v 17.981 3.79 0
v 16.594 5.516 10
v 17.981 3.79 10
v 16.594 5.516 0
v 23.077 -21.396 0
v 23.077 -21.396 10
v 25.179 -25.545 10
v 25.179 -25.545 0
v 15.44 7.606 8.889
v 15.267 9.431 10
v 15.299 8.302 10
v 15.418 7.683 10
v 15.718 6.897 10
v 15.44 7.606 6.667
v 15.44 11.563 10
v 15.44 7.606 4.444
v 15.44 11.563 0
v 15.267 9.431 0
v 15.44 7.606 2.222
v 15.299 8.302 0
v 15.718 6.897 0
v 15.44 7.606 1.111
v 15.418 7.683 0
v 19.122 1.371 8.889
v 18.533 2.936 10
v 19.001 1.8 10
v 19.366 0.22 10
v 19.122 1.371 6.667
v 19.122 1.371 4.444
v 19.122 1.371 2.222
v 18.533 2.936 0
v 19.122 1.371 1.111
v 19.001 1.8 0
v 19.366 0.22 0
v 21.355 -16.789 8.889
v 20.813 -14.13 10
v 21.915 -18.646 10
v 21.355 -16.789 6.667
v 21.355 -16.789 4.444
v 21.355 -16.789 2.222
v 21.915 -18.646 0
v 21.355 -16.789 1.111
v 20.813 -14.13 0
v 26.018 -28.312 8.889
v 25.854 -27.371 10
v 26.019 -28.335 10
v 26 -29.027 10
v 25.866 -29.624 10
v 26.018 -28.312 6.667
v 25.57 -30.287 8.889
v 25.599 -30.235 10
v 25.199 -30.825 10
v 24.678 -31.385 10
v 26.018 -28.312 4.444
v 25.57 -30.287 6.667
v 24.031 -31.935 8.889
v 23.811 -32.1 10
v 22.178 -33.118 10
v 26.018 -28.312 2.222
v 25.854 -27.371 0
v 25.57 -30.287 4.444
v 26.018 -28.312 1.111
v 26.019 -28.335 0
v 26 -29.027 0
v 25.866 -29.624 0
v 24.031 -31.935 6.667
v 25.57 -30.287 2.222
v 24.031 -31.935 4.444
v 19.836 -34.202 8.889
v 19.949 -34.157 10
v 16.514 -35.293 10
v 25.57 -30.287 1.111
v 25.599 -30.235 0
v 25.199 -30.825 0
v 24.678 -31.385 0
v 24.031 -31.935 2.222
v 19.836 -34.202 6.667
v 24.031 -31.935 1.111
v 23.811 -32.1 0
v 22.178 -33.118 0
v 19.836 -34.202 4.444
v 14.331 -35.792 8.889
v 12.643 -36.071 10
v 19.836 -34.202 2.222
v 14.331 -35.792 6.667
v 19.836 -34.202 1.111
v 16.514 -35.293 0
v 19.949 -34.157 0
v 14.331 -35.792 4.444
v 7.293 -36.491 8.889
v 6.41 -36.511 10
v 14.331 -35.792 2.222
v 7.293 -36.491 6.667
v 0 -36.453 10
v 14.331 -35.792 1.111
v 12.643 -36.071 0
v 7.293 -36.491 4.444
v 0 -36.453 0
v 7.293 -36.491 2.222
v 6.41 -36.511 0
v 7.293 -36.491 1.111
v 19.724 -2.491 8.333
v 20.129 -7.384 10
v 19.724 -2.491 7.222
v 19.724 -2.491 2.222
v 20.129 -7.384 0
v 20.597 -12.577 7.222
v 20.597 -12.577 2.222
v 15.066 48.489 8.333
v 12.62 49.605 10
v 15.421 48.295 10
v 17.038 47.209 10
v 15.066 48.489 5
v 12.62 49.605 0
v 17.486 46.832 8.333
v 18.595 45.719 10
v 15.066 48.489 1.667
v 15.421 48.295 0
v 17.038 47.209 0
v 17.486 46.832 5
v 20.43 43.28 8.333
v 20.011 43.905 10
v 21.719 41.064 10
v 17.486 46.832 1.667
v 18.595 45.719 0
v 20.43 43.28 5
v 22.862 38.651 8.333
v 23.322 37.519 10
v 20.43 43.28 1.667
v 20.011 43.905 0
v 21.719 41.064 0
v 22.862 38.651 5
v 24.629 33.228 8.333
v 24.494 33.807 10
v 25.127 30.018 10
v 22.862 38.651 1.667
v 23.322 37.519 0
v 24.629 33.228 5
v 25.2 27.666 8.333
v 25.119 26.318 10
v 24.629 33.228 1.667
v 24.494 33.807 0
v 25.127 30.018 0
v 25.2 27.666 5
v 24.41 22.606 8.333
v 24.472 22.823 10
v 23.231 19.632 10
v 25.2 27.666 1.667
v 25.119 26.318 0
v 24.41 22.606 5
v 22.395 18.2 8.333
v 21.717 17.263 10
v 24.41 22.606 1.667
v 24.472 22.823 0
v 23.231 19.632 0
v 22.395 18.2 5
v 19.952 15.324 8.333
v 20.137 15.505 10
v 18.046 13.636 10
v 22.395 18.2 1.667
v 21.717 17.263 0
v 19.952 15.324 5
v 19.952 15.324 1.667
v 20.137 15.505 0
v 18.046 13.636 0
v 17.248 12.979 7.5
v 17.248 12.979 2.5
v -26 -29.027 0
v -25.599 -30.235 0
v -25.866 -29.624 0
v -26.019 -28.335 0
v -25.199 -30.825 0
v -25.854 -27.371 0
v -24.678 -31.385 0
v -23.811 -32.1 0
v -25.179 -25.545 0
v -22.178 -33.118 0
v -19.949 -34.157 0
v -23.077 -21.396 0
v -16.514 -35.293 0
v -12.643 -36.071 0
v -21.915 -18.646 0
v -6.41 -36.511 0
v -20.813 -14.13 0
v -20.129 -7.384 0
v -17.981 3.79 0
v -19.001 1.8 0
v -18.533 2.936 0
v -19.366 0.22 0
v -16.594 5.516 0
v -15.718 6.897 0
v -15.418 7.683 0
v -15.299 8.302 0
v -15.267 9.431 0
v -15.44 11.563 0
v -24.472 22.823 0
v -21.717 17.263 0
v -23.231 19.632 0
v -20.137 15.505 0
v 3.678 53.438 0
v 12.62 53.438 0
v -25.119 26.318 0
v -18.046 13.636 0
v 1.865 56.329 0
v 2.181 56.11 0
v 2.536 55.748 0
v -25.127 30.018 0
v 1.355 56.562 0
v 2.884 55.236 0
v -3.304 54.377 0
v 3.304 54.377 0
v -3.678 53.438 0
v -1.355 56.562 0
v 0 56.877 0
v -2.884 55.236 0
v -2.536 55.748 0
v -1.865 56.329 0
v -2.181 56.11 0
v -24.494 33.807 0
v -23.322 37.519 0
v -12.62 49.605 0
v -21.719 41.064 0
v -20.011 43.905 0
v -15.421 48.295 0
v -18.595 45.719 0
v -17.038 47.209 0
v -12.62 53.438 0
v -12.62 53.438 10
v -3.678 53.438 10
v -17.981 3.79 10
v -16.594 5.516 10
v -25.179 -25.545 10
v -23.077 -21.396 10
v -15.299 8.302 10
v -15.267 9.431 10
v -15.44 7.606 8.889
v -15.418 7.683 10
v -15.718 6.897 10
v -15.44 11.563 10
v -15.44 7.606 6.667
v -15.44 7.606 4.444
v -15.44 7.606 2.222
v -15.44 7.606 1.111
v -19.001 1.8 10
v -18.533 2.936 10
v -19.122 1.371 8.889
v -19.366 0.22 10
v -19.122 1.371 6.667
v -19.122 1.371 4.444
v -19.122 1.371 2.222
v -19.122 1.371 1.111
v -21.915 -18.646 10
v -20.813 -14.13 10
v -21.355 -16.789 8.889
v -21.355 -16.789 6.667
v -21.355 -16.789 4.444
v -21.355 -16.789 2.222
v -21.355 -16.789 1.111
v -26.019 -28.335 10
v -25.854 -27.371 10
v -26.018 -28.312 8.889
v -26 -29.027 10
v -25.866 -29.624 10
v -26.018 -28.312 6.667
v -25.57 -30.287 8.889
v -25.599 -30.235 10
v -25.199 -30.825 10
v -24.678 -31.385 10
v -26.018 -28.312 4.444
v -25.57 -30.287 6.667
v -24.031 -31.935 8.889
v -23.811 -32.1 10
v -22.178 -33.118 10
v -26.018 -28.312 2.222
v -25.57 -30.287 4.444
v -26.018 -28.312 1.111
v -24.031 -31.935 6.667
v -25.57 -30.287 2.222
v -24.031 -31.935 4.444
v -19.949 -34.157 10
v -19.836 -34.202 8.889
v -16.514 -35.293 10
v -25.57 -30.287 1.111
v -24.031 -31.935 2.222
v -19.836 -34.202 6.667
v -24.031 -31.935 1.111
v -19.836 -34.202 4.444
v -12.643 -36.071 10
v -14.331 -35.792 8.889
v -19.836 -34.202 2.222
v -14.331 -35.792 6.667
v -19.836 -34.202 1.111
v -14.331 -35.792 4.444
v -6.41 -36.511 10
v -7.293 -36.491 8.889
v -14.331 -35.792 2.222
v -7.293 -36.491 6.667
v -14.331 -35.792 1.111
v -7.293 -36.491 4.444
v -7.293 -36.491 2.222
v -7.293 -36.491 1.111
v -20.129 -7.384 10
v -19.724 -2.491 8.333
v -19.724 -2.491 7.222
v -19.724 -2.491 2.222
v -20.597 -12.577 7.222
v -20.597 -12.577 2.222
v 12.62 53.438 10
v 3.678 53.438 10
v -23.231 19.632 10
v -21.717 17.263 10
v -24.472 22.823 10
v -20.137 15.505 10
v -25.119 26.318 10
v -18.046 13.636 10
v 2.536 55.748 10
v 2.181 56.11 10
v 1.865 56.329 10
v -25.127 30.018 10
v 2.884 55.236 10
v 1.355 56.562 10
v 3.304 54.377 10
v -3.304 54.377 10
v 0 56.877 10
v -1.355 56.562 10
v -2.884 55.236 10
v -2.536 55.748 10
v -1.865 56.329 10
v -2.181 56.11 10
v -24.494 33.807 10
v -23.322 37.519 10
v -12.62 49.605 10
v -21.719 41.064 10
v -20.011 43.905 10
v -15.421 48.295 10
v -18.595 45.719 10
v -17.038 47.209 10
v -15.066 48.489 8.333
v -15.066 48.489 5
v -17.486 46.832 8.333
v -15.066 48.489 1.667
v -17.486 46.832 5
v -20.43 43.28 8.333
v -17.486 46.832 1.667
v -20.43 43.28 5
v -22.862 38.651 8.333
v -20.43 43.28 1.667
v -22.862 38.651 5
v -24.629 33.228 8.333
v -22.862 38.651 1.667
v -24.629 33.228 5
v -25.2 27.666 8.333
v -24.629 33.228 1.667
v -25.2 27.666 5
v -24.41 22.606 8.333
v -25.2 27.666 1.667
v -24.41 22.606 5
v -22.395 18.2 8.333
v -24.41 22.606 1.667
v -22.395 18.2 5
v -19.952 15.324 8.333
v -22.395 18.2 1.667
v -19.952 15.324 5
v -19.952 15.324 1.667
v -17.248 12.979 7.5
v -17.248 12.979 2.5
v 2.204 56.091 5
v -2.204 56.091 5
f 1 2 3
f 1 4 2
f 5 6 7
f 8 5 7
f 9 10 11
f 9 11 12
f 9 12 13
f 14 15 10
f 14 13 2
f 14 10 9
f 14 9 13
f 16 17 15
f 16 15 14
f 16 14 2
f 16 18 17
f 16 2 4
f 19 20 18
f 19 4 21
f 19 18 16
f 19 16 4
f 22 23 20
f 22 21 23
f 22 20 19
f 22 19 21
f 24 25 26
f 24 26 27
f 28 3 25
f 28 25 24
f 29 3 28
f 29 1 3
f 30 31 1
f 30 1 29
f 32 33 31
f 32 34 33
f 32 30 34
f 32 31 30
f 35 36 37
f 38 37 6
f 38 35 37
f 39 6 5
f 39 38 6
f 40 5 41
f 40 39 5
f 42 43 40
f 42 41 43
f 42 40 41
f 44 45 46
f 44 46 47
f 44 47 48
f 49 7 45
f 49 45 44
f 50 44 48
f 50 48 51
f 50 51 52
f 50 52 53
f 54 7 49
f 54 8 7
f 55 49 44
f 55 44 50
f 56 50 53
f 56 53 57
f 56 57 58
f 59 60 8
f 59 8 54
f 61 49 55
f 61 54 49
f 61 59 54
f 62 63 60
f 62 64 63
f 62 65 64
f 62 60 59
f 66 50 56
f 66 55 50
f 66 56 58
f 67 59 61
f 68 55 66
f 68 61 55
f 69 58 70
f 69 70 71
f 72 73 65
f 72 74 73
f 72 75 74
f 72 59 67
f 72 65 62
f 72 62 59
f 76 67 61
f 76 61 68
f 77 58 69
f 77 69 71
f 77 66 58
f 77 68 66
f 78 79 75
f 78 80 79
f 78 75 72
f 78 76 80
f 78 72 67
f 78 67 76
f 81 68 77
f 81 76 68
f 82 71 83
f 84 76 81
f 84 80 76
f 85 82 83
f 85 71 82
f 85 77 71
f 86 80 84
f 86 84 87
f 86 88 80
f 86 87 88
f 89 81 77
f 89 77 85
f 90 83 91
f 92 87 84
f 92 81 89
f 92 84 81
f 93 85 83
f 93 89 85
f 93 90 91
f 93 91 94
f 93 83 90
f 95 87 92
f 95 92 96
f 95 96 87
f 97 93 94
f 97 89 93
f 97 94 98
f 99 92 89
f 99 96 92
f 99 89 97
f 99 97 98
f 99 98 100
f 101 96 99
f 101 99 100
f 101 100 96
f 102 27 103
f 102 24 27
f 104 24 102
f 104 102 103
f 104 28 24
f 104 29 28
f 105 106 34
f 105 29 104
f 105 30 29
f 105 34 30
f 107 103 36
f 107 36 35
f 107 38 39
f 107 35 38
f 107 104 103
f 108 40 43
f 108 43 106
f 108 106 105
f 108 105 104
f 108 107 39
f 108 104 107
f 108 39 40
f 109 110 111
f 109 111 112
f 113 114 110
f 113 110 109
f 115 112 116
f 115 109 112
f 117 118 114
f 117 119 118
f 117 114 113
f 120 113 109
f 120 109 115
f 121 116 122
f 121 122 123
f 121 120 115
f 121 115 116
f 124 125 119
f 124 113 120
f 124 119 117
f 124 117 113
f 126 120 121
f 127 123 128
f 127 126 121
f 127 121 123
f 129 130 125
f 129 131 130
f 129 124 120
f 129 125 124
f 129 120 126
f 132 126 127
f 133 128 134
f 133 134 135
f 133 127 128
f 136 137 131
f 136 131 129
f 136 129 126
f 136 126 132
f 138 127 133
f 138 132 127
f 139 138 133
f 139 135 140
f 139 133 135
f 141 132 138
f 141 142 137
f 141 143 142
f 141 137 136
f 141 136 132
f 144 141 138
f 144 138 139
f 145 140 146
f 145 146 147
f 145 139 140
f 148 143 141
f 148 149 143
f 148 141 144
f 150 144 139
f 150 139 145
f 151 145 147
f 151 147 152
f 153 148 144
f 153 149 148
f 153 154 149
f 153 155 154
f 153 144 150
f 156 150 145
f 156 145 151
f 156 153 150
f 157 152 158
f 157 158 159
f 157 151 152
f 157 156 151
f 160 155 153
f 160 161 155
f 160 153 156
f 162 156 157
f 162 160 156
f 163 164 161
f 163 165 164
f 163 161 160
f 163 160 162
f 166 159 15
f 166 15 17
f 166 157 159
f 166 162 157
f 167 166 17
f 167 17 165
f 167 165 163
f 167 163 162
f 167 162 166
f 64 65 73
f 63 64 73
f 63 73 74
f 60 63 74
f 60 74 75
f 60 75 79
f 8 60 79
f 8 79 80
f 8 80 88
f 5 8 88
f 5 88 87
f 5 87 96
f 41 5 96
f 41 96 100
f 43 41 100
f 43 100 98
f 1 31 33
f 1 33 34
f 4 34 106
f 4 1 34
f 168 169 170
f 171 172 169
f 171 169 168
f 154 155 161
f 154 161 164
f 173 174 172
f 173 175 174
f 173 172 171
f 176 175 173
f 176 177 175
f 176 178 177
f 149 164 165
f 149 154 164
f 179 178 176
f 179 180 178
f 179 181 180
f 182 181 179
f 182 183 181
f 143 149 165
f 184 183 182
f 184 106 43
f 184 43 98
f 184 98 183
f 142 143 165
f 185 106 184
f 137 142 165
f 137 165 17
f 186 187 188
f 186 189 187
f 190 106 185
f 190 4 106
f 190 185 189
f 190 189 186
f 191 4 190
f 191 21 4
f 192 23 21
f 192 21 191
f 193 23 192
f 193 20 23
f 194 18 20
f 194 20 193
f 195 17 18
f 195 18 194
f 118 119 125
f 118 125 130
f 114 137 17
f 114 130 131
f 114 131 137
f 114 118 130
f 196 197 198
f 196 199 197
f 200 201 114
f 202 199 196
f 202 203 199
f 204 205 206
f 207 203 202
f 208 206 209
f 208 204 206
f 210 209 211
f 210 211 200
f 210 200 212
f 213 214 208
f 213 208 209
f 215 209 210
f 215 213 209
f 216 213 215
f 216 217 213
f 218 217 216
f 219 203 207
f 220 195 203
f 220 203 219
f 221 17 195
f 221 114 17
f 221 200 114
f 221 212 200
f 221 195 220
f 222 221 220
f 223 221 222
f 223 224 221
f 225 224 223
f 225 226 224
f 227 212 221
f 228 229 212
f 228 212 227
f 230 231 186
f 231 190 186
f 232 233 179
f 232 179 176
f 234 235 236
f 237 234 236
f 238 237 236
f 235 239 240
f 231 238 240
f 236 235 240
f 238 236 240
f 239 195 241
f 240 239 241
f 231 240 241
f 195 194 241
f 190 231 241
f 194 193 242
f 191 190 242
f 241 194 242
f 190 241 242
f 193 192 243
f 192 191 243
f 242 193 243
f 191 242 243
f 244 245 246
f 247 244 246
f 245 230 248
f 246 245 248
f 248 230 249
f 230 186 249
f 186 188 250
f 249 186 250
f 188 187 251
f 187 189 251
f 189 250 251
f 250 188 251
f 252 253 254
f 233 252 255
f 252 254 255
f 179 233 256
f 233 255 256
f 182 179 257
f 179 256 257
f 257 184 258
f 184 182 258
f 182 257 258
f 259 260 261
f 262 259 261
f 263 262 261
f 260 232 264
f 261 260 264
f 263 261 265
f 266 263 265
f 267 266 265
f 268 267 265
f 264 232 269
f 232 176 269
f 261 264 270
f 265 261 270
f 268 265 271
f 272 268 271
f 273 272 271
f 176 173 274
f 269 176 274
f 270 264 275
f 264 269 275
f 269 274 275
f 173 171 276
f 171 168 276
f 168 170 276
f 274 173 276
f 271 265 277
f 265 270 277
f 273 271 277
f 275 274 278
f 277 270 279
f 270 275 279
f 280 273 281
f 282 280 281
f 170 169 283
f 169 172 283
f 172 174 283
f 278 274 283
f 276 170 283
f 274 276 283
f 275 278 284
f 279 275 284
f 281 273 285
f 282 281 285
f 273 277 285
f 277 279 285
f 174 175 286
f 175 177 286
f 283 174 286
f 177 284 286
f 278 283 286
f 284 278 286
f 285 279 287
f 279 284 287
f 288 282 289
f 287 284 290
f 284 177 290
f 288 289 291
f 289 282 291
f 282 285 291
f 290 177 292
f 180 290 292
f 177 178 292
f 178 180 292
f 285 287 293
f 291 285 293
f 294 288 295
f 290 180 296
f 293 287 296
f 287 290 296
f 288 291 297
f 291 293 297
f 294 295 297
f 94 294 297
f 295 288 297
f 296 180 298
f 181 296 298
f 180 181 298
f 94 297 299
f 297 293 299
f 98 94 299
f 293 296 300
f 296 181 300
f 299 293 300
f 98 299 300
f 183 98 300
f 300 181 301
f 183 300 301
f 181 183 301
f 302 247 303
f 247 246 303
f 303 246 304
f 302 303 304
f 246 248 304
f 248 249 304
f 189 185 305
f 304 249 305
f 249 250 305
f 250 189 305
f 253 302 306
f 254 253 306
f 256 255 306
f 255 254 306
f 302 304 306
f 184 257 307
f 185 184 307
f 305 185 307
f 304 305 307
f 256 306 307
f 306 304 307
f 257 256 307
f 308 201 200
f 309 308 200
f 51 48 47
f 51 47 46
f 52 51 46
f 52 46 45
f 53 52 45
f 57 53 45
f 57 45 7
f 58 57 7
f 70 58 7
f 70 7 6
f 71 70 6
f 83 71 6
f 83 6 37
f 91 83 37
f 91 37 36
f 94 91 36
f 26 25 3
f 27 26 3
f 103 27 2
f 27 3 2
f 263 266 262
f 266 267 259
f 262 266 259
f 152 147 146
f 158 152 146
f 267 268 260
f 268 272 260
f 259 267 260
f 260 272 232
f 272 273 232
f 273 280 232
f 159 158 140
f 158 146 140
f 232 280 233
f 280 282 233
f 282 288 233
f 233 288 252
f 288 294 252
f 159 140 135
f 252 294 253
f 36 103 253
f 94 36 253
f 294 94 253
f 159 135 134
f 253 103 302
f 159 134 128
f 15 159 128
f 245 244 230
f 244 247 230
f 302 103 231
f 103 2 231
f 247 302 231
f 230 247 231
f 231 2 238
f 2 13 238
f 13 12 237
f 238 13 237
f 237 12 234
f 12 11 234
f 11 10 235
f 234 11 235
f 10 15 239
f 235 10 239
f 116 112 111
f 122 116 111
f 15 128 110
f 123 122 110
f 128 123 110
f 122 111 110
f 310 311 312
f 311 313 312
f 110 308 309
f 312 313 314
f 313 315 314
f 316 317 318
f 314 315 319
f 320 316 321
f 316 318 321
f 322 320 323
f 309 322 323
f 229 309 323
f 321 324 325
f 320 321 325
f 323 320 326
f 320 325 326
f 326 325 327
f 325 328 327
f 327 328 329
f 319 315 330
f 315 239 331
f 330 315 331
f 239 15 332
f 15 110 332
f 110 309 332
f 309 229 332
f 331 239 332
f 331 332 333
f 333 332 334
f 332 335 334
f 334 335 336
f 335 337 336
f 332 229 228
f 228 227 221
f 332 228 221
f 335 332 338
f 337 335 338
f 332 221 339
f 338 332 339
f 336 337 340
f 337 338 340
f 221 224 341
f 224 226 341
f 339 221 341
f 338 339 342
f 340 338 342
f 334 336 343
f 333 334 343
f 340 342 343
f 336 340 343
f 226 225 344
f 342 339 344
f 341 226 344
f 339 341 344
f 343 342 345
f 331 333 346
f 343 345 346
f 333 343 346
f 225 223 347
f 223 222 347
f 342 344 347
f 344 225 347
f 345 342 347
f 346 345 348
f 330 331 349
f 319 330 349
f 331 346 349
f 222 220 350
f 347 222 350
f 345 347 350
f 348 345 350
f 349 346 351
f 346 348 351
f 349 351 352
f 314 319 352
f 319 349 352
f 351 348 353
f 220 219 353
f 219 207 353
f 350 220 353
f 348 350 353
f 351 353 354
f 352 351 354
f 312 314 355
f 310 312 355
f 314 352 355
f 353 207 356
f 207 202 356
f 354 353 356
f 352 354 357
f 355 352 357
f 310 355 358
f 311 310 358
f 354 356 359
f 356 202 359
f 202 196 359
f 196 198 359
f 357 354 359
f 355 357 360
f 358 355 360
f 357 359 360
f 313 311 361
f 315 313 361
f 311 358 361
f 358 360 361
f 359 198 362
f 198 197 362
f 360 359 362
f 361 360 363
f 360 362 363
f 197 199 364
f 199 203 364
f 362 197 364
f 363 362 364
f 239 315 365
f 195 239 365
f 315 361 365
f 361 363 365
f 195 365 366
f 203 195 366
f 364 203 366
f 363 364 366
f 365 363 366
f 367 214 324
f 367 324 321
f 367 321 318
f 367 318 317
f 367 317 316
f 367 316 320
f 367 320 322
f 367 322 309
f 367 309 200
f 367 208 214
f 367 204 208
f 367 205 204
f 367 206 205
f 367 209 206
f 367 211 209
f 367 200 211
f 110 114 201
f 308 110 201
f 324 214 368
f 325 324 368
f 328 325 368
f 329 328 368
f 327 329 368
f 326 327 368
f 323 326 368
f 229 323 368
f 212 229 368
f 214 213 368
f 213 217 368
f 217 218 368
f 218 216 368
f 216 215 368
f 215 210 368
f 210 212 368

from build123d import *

# Parameters (mm, degrees)
F1_DEPTH = 10


with BuildPart() as f1:
    # F0 (on Top) → F1 (new body)
    with BuildSketch(Plane.XY):
        with BuildLine():
            add(Edge.make_bspline(
                [(0, 56.8773113191), (0.8054235015, 56.7355107175), (2.5282170988, 56.4322005111), (3.2783261719, 54.4782552335), (3.6777516361, 53.4377992153)],
                knots=[0, 0, 0, 0, 0.4675101549, 1, 1, 1, 1], degree=3))
            add(Edge.make_bspline(
                [(0, 56.8773113191), (-0.8054235015, 56.7355107175), (-2.5282170988, 56.4322005111), (-3.2783261719, 54.4782552335), (-3.6777516361, 53.4377992153)],
                knots=[0, 0, 0, 0, 0.4675101549, 1, 1, 1, 1], degree=3))
            Line((-3.6777516361, 53.4377992153), (-12.6204816625, 53.4377992153))
            Line((-12.6204816625, 53.4377992153), (-12.6204816625, 49.6052019298))
            add(Edge.make_bspline(
                [(-12.6204816625, 49.6052019298), (-14.2292043355, 48.9309336469), (-18.1356514841, 47.2977728965), (-23.491041923, 38.6597412116), (-26.1695869874, 27.8273338957), (-23.2800031482, 17.9260135091), (-17.7682202454, 13.4101466747), (-15.8614338942, 11.8365177177), (-15.4396751896, 11.5627255291)],
                knots=[0, 0, 0, 0, 0.1456055555, 0.3381046139, 0.5442981339, 0.737621003, 0.9006913089, 1, 1, 1, 1], degree=3))
            add(Edge.make_bspline(
                [(-15.4396751896, 11.5627255291), (-15.3451802392, 10.1370824505), (-14.8241027078, 7.5357962998), (-17.6383536163, 4.2696618781), (-19.796775762, 1.4933282459), (-20.1749353943, -12.5436288597), (-22.1393711386, -20.5614990323), (-27.1604582277, -28.2344962413), (-24.1954731768, -32.6664090658), (-13.9227619627, -36.7575290948), (-4.9010215255, -36.5603540128), (0, -36.4531837404)],
                knots=[0, 0, 0, 0, 0.0815669811, 0.1614588304, 0.2376385783, 0.3877305251, 0.5127687448, 0.6288302189, 0.7121864321, 0.8446784144, 1, 1, 1, 1], degree=3))
            add(Edge.make_bspline(
                [(15.4396751896, 11.5627255291), (15.3451802392, 10.1370824505), (14.8241027078, 7.5357962998), (17.6383536163, 4.2696618781), (19.796775762, 1.4933282459), (20.1749353943, -12.5436288597), (22.1393711386, -20.5614990323), (27.1604582277, -28.2344962413), (24.1954731768, -32.6664090658), (13.9227619627, -36.7575290948), (4.9010215255, -36.5603540128), (0, -36.4531837404)],
                knots=[0, 0, 0, 0, 0.0815669811, 0.1614588304, 0.2376385783, 0.3877305251, 0.5127687448, 0.6288302189, 0.7121864321, 0.8446784144, 1, 1, 1, 1], degree=3))
            add(Edge.make_bspline(
                [(12.6204816625, 49.6052019298), (14.2292043355, 48.9309336469), (18.1356514841, 47.2977728965), (23.491041923, 38.6597412116), (26.1695869874, 27.8273338957), (23.2800031482, 17.9260135091), (17.7682202454, 13.4101466747), (15.8614338942, 11.8365177177), (15.4396751896, 11.5627255291)],
                knots=[0, 0, 0, 0, 0.1456055555, 0.3381046139, 0.5442981339, 0.737621003, 0.9006913089, 1, 1, 1, 1], degree=3))
            Line((12.6204816625, 49.6052019298), (12.6204816625, 53.4377992153))
            Line((12.6204816625, 53.4377992153), (3.6777516361, 53.4377992153))
        make_face()
    extrude(amount=F1_DEPTH)


solid = f1.part
